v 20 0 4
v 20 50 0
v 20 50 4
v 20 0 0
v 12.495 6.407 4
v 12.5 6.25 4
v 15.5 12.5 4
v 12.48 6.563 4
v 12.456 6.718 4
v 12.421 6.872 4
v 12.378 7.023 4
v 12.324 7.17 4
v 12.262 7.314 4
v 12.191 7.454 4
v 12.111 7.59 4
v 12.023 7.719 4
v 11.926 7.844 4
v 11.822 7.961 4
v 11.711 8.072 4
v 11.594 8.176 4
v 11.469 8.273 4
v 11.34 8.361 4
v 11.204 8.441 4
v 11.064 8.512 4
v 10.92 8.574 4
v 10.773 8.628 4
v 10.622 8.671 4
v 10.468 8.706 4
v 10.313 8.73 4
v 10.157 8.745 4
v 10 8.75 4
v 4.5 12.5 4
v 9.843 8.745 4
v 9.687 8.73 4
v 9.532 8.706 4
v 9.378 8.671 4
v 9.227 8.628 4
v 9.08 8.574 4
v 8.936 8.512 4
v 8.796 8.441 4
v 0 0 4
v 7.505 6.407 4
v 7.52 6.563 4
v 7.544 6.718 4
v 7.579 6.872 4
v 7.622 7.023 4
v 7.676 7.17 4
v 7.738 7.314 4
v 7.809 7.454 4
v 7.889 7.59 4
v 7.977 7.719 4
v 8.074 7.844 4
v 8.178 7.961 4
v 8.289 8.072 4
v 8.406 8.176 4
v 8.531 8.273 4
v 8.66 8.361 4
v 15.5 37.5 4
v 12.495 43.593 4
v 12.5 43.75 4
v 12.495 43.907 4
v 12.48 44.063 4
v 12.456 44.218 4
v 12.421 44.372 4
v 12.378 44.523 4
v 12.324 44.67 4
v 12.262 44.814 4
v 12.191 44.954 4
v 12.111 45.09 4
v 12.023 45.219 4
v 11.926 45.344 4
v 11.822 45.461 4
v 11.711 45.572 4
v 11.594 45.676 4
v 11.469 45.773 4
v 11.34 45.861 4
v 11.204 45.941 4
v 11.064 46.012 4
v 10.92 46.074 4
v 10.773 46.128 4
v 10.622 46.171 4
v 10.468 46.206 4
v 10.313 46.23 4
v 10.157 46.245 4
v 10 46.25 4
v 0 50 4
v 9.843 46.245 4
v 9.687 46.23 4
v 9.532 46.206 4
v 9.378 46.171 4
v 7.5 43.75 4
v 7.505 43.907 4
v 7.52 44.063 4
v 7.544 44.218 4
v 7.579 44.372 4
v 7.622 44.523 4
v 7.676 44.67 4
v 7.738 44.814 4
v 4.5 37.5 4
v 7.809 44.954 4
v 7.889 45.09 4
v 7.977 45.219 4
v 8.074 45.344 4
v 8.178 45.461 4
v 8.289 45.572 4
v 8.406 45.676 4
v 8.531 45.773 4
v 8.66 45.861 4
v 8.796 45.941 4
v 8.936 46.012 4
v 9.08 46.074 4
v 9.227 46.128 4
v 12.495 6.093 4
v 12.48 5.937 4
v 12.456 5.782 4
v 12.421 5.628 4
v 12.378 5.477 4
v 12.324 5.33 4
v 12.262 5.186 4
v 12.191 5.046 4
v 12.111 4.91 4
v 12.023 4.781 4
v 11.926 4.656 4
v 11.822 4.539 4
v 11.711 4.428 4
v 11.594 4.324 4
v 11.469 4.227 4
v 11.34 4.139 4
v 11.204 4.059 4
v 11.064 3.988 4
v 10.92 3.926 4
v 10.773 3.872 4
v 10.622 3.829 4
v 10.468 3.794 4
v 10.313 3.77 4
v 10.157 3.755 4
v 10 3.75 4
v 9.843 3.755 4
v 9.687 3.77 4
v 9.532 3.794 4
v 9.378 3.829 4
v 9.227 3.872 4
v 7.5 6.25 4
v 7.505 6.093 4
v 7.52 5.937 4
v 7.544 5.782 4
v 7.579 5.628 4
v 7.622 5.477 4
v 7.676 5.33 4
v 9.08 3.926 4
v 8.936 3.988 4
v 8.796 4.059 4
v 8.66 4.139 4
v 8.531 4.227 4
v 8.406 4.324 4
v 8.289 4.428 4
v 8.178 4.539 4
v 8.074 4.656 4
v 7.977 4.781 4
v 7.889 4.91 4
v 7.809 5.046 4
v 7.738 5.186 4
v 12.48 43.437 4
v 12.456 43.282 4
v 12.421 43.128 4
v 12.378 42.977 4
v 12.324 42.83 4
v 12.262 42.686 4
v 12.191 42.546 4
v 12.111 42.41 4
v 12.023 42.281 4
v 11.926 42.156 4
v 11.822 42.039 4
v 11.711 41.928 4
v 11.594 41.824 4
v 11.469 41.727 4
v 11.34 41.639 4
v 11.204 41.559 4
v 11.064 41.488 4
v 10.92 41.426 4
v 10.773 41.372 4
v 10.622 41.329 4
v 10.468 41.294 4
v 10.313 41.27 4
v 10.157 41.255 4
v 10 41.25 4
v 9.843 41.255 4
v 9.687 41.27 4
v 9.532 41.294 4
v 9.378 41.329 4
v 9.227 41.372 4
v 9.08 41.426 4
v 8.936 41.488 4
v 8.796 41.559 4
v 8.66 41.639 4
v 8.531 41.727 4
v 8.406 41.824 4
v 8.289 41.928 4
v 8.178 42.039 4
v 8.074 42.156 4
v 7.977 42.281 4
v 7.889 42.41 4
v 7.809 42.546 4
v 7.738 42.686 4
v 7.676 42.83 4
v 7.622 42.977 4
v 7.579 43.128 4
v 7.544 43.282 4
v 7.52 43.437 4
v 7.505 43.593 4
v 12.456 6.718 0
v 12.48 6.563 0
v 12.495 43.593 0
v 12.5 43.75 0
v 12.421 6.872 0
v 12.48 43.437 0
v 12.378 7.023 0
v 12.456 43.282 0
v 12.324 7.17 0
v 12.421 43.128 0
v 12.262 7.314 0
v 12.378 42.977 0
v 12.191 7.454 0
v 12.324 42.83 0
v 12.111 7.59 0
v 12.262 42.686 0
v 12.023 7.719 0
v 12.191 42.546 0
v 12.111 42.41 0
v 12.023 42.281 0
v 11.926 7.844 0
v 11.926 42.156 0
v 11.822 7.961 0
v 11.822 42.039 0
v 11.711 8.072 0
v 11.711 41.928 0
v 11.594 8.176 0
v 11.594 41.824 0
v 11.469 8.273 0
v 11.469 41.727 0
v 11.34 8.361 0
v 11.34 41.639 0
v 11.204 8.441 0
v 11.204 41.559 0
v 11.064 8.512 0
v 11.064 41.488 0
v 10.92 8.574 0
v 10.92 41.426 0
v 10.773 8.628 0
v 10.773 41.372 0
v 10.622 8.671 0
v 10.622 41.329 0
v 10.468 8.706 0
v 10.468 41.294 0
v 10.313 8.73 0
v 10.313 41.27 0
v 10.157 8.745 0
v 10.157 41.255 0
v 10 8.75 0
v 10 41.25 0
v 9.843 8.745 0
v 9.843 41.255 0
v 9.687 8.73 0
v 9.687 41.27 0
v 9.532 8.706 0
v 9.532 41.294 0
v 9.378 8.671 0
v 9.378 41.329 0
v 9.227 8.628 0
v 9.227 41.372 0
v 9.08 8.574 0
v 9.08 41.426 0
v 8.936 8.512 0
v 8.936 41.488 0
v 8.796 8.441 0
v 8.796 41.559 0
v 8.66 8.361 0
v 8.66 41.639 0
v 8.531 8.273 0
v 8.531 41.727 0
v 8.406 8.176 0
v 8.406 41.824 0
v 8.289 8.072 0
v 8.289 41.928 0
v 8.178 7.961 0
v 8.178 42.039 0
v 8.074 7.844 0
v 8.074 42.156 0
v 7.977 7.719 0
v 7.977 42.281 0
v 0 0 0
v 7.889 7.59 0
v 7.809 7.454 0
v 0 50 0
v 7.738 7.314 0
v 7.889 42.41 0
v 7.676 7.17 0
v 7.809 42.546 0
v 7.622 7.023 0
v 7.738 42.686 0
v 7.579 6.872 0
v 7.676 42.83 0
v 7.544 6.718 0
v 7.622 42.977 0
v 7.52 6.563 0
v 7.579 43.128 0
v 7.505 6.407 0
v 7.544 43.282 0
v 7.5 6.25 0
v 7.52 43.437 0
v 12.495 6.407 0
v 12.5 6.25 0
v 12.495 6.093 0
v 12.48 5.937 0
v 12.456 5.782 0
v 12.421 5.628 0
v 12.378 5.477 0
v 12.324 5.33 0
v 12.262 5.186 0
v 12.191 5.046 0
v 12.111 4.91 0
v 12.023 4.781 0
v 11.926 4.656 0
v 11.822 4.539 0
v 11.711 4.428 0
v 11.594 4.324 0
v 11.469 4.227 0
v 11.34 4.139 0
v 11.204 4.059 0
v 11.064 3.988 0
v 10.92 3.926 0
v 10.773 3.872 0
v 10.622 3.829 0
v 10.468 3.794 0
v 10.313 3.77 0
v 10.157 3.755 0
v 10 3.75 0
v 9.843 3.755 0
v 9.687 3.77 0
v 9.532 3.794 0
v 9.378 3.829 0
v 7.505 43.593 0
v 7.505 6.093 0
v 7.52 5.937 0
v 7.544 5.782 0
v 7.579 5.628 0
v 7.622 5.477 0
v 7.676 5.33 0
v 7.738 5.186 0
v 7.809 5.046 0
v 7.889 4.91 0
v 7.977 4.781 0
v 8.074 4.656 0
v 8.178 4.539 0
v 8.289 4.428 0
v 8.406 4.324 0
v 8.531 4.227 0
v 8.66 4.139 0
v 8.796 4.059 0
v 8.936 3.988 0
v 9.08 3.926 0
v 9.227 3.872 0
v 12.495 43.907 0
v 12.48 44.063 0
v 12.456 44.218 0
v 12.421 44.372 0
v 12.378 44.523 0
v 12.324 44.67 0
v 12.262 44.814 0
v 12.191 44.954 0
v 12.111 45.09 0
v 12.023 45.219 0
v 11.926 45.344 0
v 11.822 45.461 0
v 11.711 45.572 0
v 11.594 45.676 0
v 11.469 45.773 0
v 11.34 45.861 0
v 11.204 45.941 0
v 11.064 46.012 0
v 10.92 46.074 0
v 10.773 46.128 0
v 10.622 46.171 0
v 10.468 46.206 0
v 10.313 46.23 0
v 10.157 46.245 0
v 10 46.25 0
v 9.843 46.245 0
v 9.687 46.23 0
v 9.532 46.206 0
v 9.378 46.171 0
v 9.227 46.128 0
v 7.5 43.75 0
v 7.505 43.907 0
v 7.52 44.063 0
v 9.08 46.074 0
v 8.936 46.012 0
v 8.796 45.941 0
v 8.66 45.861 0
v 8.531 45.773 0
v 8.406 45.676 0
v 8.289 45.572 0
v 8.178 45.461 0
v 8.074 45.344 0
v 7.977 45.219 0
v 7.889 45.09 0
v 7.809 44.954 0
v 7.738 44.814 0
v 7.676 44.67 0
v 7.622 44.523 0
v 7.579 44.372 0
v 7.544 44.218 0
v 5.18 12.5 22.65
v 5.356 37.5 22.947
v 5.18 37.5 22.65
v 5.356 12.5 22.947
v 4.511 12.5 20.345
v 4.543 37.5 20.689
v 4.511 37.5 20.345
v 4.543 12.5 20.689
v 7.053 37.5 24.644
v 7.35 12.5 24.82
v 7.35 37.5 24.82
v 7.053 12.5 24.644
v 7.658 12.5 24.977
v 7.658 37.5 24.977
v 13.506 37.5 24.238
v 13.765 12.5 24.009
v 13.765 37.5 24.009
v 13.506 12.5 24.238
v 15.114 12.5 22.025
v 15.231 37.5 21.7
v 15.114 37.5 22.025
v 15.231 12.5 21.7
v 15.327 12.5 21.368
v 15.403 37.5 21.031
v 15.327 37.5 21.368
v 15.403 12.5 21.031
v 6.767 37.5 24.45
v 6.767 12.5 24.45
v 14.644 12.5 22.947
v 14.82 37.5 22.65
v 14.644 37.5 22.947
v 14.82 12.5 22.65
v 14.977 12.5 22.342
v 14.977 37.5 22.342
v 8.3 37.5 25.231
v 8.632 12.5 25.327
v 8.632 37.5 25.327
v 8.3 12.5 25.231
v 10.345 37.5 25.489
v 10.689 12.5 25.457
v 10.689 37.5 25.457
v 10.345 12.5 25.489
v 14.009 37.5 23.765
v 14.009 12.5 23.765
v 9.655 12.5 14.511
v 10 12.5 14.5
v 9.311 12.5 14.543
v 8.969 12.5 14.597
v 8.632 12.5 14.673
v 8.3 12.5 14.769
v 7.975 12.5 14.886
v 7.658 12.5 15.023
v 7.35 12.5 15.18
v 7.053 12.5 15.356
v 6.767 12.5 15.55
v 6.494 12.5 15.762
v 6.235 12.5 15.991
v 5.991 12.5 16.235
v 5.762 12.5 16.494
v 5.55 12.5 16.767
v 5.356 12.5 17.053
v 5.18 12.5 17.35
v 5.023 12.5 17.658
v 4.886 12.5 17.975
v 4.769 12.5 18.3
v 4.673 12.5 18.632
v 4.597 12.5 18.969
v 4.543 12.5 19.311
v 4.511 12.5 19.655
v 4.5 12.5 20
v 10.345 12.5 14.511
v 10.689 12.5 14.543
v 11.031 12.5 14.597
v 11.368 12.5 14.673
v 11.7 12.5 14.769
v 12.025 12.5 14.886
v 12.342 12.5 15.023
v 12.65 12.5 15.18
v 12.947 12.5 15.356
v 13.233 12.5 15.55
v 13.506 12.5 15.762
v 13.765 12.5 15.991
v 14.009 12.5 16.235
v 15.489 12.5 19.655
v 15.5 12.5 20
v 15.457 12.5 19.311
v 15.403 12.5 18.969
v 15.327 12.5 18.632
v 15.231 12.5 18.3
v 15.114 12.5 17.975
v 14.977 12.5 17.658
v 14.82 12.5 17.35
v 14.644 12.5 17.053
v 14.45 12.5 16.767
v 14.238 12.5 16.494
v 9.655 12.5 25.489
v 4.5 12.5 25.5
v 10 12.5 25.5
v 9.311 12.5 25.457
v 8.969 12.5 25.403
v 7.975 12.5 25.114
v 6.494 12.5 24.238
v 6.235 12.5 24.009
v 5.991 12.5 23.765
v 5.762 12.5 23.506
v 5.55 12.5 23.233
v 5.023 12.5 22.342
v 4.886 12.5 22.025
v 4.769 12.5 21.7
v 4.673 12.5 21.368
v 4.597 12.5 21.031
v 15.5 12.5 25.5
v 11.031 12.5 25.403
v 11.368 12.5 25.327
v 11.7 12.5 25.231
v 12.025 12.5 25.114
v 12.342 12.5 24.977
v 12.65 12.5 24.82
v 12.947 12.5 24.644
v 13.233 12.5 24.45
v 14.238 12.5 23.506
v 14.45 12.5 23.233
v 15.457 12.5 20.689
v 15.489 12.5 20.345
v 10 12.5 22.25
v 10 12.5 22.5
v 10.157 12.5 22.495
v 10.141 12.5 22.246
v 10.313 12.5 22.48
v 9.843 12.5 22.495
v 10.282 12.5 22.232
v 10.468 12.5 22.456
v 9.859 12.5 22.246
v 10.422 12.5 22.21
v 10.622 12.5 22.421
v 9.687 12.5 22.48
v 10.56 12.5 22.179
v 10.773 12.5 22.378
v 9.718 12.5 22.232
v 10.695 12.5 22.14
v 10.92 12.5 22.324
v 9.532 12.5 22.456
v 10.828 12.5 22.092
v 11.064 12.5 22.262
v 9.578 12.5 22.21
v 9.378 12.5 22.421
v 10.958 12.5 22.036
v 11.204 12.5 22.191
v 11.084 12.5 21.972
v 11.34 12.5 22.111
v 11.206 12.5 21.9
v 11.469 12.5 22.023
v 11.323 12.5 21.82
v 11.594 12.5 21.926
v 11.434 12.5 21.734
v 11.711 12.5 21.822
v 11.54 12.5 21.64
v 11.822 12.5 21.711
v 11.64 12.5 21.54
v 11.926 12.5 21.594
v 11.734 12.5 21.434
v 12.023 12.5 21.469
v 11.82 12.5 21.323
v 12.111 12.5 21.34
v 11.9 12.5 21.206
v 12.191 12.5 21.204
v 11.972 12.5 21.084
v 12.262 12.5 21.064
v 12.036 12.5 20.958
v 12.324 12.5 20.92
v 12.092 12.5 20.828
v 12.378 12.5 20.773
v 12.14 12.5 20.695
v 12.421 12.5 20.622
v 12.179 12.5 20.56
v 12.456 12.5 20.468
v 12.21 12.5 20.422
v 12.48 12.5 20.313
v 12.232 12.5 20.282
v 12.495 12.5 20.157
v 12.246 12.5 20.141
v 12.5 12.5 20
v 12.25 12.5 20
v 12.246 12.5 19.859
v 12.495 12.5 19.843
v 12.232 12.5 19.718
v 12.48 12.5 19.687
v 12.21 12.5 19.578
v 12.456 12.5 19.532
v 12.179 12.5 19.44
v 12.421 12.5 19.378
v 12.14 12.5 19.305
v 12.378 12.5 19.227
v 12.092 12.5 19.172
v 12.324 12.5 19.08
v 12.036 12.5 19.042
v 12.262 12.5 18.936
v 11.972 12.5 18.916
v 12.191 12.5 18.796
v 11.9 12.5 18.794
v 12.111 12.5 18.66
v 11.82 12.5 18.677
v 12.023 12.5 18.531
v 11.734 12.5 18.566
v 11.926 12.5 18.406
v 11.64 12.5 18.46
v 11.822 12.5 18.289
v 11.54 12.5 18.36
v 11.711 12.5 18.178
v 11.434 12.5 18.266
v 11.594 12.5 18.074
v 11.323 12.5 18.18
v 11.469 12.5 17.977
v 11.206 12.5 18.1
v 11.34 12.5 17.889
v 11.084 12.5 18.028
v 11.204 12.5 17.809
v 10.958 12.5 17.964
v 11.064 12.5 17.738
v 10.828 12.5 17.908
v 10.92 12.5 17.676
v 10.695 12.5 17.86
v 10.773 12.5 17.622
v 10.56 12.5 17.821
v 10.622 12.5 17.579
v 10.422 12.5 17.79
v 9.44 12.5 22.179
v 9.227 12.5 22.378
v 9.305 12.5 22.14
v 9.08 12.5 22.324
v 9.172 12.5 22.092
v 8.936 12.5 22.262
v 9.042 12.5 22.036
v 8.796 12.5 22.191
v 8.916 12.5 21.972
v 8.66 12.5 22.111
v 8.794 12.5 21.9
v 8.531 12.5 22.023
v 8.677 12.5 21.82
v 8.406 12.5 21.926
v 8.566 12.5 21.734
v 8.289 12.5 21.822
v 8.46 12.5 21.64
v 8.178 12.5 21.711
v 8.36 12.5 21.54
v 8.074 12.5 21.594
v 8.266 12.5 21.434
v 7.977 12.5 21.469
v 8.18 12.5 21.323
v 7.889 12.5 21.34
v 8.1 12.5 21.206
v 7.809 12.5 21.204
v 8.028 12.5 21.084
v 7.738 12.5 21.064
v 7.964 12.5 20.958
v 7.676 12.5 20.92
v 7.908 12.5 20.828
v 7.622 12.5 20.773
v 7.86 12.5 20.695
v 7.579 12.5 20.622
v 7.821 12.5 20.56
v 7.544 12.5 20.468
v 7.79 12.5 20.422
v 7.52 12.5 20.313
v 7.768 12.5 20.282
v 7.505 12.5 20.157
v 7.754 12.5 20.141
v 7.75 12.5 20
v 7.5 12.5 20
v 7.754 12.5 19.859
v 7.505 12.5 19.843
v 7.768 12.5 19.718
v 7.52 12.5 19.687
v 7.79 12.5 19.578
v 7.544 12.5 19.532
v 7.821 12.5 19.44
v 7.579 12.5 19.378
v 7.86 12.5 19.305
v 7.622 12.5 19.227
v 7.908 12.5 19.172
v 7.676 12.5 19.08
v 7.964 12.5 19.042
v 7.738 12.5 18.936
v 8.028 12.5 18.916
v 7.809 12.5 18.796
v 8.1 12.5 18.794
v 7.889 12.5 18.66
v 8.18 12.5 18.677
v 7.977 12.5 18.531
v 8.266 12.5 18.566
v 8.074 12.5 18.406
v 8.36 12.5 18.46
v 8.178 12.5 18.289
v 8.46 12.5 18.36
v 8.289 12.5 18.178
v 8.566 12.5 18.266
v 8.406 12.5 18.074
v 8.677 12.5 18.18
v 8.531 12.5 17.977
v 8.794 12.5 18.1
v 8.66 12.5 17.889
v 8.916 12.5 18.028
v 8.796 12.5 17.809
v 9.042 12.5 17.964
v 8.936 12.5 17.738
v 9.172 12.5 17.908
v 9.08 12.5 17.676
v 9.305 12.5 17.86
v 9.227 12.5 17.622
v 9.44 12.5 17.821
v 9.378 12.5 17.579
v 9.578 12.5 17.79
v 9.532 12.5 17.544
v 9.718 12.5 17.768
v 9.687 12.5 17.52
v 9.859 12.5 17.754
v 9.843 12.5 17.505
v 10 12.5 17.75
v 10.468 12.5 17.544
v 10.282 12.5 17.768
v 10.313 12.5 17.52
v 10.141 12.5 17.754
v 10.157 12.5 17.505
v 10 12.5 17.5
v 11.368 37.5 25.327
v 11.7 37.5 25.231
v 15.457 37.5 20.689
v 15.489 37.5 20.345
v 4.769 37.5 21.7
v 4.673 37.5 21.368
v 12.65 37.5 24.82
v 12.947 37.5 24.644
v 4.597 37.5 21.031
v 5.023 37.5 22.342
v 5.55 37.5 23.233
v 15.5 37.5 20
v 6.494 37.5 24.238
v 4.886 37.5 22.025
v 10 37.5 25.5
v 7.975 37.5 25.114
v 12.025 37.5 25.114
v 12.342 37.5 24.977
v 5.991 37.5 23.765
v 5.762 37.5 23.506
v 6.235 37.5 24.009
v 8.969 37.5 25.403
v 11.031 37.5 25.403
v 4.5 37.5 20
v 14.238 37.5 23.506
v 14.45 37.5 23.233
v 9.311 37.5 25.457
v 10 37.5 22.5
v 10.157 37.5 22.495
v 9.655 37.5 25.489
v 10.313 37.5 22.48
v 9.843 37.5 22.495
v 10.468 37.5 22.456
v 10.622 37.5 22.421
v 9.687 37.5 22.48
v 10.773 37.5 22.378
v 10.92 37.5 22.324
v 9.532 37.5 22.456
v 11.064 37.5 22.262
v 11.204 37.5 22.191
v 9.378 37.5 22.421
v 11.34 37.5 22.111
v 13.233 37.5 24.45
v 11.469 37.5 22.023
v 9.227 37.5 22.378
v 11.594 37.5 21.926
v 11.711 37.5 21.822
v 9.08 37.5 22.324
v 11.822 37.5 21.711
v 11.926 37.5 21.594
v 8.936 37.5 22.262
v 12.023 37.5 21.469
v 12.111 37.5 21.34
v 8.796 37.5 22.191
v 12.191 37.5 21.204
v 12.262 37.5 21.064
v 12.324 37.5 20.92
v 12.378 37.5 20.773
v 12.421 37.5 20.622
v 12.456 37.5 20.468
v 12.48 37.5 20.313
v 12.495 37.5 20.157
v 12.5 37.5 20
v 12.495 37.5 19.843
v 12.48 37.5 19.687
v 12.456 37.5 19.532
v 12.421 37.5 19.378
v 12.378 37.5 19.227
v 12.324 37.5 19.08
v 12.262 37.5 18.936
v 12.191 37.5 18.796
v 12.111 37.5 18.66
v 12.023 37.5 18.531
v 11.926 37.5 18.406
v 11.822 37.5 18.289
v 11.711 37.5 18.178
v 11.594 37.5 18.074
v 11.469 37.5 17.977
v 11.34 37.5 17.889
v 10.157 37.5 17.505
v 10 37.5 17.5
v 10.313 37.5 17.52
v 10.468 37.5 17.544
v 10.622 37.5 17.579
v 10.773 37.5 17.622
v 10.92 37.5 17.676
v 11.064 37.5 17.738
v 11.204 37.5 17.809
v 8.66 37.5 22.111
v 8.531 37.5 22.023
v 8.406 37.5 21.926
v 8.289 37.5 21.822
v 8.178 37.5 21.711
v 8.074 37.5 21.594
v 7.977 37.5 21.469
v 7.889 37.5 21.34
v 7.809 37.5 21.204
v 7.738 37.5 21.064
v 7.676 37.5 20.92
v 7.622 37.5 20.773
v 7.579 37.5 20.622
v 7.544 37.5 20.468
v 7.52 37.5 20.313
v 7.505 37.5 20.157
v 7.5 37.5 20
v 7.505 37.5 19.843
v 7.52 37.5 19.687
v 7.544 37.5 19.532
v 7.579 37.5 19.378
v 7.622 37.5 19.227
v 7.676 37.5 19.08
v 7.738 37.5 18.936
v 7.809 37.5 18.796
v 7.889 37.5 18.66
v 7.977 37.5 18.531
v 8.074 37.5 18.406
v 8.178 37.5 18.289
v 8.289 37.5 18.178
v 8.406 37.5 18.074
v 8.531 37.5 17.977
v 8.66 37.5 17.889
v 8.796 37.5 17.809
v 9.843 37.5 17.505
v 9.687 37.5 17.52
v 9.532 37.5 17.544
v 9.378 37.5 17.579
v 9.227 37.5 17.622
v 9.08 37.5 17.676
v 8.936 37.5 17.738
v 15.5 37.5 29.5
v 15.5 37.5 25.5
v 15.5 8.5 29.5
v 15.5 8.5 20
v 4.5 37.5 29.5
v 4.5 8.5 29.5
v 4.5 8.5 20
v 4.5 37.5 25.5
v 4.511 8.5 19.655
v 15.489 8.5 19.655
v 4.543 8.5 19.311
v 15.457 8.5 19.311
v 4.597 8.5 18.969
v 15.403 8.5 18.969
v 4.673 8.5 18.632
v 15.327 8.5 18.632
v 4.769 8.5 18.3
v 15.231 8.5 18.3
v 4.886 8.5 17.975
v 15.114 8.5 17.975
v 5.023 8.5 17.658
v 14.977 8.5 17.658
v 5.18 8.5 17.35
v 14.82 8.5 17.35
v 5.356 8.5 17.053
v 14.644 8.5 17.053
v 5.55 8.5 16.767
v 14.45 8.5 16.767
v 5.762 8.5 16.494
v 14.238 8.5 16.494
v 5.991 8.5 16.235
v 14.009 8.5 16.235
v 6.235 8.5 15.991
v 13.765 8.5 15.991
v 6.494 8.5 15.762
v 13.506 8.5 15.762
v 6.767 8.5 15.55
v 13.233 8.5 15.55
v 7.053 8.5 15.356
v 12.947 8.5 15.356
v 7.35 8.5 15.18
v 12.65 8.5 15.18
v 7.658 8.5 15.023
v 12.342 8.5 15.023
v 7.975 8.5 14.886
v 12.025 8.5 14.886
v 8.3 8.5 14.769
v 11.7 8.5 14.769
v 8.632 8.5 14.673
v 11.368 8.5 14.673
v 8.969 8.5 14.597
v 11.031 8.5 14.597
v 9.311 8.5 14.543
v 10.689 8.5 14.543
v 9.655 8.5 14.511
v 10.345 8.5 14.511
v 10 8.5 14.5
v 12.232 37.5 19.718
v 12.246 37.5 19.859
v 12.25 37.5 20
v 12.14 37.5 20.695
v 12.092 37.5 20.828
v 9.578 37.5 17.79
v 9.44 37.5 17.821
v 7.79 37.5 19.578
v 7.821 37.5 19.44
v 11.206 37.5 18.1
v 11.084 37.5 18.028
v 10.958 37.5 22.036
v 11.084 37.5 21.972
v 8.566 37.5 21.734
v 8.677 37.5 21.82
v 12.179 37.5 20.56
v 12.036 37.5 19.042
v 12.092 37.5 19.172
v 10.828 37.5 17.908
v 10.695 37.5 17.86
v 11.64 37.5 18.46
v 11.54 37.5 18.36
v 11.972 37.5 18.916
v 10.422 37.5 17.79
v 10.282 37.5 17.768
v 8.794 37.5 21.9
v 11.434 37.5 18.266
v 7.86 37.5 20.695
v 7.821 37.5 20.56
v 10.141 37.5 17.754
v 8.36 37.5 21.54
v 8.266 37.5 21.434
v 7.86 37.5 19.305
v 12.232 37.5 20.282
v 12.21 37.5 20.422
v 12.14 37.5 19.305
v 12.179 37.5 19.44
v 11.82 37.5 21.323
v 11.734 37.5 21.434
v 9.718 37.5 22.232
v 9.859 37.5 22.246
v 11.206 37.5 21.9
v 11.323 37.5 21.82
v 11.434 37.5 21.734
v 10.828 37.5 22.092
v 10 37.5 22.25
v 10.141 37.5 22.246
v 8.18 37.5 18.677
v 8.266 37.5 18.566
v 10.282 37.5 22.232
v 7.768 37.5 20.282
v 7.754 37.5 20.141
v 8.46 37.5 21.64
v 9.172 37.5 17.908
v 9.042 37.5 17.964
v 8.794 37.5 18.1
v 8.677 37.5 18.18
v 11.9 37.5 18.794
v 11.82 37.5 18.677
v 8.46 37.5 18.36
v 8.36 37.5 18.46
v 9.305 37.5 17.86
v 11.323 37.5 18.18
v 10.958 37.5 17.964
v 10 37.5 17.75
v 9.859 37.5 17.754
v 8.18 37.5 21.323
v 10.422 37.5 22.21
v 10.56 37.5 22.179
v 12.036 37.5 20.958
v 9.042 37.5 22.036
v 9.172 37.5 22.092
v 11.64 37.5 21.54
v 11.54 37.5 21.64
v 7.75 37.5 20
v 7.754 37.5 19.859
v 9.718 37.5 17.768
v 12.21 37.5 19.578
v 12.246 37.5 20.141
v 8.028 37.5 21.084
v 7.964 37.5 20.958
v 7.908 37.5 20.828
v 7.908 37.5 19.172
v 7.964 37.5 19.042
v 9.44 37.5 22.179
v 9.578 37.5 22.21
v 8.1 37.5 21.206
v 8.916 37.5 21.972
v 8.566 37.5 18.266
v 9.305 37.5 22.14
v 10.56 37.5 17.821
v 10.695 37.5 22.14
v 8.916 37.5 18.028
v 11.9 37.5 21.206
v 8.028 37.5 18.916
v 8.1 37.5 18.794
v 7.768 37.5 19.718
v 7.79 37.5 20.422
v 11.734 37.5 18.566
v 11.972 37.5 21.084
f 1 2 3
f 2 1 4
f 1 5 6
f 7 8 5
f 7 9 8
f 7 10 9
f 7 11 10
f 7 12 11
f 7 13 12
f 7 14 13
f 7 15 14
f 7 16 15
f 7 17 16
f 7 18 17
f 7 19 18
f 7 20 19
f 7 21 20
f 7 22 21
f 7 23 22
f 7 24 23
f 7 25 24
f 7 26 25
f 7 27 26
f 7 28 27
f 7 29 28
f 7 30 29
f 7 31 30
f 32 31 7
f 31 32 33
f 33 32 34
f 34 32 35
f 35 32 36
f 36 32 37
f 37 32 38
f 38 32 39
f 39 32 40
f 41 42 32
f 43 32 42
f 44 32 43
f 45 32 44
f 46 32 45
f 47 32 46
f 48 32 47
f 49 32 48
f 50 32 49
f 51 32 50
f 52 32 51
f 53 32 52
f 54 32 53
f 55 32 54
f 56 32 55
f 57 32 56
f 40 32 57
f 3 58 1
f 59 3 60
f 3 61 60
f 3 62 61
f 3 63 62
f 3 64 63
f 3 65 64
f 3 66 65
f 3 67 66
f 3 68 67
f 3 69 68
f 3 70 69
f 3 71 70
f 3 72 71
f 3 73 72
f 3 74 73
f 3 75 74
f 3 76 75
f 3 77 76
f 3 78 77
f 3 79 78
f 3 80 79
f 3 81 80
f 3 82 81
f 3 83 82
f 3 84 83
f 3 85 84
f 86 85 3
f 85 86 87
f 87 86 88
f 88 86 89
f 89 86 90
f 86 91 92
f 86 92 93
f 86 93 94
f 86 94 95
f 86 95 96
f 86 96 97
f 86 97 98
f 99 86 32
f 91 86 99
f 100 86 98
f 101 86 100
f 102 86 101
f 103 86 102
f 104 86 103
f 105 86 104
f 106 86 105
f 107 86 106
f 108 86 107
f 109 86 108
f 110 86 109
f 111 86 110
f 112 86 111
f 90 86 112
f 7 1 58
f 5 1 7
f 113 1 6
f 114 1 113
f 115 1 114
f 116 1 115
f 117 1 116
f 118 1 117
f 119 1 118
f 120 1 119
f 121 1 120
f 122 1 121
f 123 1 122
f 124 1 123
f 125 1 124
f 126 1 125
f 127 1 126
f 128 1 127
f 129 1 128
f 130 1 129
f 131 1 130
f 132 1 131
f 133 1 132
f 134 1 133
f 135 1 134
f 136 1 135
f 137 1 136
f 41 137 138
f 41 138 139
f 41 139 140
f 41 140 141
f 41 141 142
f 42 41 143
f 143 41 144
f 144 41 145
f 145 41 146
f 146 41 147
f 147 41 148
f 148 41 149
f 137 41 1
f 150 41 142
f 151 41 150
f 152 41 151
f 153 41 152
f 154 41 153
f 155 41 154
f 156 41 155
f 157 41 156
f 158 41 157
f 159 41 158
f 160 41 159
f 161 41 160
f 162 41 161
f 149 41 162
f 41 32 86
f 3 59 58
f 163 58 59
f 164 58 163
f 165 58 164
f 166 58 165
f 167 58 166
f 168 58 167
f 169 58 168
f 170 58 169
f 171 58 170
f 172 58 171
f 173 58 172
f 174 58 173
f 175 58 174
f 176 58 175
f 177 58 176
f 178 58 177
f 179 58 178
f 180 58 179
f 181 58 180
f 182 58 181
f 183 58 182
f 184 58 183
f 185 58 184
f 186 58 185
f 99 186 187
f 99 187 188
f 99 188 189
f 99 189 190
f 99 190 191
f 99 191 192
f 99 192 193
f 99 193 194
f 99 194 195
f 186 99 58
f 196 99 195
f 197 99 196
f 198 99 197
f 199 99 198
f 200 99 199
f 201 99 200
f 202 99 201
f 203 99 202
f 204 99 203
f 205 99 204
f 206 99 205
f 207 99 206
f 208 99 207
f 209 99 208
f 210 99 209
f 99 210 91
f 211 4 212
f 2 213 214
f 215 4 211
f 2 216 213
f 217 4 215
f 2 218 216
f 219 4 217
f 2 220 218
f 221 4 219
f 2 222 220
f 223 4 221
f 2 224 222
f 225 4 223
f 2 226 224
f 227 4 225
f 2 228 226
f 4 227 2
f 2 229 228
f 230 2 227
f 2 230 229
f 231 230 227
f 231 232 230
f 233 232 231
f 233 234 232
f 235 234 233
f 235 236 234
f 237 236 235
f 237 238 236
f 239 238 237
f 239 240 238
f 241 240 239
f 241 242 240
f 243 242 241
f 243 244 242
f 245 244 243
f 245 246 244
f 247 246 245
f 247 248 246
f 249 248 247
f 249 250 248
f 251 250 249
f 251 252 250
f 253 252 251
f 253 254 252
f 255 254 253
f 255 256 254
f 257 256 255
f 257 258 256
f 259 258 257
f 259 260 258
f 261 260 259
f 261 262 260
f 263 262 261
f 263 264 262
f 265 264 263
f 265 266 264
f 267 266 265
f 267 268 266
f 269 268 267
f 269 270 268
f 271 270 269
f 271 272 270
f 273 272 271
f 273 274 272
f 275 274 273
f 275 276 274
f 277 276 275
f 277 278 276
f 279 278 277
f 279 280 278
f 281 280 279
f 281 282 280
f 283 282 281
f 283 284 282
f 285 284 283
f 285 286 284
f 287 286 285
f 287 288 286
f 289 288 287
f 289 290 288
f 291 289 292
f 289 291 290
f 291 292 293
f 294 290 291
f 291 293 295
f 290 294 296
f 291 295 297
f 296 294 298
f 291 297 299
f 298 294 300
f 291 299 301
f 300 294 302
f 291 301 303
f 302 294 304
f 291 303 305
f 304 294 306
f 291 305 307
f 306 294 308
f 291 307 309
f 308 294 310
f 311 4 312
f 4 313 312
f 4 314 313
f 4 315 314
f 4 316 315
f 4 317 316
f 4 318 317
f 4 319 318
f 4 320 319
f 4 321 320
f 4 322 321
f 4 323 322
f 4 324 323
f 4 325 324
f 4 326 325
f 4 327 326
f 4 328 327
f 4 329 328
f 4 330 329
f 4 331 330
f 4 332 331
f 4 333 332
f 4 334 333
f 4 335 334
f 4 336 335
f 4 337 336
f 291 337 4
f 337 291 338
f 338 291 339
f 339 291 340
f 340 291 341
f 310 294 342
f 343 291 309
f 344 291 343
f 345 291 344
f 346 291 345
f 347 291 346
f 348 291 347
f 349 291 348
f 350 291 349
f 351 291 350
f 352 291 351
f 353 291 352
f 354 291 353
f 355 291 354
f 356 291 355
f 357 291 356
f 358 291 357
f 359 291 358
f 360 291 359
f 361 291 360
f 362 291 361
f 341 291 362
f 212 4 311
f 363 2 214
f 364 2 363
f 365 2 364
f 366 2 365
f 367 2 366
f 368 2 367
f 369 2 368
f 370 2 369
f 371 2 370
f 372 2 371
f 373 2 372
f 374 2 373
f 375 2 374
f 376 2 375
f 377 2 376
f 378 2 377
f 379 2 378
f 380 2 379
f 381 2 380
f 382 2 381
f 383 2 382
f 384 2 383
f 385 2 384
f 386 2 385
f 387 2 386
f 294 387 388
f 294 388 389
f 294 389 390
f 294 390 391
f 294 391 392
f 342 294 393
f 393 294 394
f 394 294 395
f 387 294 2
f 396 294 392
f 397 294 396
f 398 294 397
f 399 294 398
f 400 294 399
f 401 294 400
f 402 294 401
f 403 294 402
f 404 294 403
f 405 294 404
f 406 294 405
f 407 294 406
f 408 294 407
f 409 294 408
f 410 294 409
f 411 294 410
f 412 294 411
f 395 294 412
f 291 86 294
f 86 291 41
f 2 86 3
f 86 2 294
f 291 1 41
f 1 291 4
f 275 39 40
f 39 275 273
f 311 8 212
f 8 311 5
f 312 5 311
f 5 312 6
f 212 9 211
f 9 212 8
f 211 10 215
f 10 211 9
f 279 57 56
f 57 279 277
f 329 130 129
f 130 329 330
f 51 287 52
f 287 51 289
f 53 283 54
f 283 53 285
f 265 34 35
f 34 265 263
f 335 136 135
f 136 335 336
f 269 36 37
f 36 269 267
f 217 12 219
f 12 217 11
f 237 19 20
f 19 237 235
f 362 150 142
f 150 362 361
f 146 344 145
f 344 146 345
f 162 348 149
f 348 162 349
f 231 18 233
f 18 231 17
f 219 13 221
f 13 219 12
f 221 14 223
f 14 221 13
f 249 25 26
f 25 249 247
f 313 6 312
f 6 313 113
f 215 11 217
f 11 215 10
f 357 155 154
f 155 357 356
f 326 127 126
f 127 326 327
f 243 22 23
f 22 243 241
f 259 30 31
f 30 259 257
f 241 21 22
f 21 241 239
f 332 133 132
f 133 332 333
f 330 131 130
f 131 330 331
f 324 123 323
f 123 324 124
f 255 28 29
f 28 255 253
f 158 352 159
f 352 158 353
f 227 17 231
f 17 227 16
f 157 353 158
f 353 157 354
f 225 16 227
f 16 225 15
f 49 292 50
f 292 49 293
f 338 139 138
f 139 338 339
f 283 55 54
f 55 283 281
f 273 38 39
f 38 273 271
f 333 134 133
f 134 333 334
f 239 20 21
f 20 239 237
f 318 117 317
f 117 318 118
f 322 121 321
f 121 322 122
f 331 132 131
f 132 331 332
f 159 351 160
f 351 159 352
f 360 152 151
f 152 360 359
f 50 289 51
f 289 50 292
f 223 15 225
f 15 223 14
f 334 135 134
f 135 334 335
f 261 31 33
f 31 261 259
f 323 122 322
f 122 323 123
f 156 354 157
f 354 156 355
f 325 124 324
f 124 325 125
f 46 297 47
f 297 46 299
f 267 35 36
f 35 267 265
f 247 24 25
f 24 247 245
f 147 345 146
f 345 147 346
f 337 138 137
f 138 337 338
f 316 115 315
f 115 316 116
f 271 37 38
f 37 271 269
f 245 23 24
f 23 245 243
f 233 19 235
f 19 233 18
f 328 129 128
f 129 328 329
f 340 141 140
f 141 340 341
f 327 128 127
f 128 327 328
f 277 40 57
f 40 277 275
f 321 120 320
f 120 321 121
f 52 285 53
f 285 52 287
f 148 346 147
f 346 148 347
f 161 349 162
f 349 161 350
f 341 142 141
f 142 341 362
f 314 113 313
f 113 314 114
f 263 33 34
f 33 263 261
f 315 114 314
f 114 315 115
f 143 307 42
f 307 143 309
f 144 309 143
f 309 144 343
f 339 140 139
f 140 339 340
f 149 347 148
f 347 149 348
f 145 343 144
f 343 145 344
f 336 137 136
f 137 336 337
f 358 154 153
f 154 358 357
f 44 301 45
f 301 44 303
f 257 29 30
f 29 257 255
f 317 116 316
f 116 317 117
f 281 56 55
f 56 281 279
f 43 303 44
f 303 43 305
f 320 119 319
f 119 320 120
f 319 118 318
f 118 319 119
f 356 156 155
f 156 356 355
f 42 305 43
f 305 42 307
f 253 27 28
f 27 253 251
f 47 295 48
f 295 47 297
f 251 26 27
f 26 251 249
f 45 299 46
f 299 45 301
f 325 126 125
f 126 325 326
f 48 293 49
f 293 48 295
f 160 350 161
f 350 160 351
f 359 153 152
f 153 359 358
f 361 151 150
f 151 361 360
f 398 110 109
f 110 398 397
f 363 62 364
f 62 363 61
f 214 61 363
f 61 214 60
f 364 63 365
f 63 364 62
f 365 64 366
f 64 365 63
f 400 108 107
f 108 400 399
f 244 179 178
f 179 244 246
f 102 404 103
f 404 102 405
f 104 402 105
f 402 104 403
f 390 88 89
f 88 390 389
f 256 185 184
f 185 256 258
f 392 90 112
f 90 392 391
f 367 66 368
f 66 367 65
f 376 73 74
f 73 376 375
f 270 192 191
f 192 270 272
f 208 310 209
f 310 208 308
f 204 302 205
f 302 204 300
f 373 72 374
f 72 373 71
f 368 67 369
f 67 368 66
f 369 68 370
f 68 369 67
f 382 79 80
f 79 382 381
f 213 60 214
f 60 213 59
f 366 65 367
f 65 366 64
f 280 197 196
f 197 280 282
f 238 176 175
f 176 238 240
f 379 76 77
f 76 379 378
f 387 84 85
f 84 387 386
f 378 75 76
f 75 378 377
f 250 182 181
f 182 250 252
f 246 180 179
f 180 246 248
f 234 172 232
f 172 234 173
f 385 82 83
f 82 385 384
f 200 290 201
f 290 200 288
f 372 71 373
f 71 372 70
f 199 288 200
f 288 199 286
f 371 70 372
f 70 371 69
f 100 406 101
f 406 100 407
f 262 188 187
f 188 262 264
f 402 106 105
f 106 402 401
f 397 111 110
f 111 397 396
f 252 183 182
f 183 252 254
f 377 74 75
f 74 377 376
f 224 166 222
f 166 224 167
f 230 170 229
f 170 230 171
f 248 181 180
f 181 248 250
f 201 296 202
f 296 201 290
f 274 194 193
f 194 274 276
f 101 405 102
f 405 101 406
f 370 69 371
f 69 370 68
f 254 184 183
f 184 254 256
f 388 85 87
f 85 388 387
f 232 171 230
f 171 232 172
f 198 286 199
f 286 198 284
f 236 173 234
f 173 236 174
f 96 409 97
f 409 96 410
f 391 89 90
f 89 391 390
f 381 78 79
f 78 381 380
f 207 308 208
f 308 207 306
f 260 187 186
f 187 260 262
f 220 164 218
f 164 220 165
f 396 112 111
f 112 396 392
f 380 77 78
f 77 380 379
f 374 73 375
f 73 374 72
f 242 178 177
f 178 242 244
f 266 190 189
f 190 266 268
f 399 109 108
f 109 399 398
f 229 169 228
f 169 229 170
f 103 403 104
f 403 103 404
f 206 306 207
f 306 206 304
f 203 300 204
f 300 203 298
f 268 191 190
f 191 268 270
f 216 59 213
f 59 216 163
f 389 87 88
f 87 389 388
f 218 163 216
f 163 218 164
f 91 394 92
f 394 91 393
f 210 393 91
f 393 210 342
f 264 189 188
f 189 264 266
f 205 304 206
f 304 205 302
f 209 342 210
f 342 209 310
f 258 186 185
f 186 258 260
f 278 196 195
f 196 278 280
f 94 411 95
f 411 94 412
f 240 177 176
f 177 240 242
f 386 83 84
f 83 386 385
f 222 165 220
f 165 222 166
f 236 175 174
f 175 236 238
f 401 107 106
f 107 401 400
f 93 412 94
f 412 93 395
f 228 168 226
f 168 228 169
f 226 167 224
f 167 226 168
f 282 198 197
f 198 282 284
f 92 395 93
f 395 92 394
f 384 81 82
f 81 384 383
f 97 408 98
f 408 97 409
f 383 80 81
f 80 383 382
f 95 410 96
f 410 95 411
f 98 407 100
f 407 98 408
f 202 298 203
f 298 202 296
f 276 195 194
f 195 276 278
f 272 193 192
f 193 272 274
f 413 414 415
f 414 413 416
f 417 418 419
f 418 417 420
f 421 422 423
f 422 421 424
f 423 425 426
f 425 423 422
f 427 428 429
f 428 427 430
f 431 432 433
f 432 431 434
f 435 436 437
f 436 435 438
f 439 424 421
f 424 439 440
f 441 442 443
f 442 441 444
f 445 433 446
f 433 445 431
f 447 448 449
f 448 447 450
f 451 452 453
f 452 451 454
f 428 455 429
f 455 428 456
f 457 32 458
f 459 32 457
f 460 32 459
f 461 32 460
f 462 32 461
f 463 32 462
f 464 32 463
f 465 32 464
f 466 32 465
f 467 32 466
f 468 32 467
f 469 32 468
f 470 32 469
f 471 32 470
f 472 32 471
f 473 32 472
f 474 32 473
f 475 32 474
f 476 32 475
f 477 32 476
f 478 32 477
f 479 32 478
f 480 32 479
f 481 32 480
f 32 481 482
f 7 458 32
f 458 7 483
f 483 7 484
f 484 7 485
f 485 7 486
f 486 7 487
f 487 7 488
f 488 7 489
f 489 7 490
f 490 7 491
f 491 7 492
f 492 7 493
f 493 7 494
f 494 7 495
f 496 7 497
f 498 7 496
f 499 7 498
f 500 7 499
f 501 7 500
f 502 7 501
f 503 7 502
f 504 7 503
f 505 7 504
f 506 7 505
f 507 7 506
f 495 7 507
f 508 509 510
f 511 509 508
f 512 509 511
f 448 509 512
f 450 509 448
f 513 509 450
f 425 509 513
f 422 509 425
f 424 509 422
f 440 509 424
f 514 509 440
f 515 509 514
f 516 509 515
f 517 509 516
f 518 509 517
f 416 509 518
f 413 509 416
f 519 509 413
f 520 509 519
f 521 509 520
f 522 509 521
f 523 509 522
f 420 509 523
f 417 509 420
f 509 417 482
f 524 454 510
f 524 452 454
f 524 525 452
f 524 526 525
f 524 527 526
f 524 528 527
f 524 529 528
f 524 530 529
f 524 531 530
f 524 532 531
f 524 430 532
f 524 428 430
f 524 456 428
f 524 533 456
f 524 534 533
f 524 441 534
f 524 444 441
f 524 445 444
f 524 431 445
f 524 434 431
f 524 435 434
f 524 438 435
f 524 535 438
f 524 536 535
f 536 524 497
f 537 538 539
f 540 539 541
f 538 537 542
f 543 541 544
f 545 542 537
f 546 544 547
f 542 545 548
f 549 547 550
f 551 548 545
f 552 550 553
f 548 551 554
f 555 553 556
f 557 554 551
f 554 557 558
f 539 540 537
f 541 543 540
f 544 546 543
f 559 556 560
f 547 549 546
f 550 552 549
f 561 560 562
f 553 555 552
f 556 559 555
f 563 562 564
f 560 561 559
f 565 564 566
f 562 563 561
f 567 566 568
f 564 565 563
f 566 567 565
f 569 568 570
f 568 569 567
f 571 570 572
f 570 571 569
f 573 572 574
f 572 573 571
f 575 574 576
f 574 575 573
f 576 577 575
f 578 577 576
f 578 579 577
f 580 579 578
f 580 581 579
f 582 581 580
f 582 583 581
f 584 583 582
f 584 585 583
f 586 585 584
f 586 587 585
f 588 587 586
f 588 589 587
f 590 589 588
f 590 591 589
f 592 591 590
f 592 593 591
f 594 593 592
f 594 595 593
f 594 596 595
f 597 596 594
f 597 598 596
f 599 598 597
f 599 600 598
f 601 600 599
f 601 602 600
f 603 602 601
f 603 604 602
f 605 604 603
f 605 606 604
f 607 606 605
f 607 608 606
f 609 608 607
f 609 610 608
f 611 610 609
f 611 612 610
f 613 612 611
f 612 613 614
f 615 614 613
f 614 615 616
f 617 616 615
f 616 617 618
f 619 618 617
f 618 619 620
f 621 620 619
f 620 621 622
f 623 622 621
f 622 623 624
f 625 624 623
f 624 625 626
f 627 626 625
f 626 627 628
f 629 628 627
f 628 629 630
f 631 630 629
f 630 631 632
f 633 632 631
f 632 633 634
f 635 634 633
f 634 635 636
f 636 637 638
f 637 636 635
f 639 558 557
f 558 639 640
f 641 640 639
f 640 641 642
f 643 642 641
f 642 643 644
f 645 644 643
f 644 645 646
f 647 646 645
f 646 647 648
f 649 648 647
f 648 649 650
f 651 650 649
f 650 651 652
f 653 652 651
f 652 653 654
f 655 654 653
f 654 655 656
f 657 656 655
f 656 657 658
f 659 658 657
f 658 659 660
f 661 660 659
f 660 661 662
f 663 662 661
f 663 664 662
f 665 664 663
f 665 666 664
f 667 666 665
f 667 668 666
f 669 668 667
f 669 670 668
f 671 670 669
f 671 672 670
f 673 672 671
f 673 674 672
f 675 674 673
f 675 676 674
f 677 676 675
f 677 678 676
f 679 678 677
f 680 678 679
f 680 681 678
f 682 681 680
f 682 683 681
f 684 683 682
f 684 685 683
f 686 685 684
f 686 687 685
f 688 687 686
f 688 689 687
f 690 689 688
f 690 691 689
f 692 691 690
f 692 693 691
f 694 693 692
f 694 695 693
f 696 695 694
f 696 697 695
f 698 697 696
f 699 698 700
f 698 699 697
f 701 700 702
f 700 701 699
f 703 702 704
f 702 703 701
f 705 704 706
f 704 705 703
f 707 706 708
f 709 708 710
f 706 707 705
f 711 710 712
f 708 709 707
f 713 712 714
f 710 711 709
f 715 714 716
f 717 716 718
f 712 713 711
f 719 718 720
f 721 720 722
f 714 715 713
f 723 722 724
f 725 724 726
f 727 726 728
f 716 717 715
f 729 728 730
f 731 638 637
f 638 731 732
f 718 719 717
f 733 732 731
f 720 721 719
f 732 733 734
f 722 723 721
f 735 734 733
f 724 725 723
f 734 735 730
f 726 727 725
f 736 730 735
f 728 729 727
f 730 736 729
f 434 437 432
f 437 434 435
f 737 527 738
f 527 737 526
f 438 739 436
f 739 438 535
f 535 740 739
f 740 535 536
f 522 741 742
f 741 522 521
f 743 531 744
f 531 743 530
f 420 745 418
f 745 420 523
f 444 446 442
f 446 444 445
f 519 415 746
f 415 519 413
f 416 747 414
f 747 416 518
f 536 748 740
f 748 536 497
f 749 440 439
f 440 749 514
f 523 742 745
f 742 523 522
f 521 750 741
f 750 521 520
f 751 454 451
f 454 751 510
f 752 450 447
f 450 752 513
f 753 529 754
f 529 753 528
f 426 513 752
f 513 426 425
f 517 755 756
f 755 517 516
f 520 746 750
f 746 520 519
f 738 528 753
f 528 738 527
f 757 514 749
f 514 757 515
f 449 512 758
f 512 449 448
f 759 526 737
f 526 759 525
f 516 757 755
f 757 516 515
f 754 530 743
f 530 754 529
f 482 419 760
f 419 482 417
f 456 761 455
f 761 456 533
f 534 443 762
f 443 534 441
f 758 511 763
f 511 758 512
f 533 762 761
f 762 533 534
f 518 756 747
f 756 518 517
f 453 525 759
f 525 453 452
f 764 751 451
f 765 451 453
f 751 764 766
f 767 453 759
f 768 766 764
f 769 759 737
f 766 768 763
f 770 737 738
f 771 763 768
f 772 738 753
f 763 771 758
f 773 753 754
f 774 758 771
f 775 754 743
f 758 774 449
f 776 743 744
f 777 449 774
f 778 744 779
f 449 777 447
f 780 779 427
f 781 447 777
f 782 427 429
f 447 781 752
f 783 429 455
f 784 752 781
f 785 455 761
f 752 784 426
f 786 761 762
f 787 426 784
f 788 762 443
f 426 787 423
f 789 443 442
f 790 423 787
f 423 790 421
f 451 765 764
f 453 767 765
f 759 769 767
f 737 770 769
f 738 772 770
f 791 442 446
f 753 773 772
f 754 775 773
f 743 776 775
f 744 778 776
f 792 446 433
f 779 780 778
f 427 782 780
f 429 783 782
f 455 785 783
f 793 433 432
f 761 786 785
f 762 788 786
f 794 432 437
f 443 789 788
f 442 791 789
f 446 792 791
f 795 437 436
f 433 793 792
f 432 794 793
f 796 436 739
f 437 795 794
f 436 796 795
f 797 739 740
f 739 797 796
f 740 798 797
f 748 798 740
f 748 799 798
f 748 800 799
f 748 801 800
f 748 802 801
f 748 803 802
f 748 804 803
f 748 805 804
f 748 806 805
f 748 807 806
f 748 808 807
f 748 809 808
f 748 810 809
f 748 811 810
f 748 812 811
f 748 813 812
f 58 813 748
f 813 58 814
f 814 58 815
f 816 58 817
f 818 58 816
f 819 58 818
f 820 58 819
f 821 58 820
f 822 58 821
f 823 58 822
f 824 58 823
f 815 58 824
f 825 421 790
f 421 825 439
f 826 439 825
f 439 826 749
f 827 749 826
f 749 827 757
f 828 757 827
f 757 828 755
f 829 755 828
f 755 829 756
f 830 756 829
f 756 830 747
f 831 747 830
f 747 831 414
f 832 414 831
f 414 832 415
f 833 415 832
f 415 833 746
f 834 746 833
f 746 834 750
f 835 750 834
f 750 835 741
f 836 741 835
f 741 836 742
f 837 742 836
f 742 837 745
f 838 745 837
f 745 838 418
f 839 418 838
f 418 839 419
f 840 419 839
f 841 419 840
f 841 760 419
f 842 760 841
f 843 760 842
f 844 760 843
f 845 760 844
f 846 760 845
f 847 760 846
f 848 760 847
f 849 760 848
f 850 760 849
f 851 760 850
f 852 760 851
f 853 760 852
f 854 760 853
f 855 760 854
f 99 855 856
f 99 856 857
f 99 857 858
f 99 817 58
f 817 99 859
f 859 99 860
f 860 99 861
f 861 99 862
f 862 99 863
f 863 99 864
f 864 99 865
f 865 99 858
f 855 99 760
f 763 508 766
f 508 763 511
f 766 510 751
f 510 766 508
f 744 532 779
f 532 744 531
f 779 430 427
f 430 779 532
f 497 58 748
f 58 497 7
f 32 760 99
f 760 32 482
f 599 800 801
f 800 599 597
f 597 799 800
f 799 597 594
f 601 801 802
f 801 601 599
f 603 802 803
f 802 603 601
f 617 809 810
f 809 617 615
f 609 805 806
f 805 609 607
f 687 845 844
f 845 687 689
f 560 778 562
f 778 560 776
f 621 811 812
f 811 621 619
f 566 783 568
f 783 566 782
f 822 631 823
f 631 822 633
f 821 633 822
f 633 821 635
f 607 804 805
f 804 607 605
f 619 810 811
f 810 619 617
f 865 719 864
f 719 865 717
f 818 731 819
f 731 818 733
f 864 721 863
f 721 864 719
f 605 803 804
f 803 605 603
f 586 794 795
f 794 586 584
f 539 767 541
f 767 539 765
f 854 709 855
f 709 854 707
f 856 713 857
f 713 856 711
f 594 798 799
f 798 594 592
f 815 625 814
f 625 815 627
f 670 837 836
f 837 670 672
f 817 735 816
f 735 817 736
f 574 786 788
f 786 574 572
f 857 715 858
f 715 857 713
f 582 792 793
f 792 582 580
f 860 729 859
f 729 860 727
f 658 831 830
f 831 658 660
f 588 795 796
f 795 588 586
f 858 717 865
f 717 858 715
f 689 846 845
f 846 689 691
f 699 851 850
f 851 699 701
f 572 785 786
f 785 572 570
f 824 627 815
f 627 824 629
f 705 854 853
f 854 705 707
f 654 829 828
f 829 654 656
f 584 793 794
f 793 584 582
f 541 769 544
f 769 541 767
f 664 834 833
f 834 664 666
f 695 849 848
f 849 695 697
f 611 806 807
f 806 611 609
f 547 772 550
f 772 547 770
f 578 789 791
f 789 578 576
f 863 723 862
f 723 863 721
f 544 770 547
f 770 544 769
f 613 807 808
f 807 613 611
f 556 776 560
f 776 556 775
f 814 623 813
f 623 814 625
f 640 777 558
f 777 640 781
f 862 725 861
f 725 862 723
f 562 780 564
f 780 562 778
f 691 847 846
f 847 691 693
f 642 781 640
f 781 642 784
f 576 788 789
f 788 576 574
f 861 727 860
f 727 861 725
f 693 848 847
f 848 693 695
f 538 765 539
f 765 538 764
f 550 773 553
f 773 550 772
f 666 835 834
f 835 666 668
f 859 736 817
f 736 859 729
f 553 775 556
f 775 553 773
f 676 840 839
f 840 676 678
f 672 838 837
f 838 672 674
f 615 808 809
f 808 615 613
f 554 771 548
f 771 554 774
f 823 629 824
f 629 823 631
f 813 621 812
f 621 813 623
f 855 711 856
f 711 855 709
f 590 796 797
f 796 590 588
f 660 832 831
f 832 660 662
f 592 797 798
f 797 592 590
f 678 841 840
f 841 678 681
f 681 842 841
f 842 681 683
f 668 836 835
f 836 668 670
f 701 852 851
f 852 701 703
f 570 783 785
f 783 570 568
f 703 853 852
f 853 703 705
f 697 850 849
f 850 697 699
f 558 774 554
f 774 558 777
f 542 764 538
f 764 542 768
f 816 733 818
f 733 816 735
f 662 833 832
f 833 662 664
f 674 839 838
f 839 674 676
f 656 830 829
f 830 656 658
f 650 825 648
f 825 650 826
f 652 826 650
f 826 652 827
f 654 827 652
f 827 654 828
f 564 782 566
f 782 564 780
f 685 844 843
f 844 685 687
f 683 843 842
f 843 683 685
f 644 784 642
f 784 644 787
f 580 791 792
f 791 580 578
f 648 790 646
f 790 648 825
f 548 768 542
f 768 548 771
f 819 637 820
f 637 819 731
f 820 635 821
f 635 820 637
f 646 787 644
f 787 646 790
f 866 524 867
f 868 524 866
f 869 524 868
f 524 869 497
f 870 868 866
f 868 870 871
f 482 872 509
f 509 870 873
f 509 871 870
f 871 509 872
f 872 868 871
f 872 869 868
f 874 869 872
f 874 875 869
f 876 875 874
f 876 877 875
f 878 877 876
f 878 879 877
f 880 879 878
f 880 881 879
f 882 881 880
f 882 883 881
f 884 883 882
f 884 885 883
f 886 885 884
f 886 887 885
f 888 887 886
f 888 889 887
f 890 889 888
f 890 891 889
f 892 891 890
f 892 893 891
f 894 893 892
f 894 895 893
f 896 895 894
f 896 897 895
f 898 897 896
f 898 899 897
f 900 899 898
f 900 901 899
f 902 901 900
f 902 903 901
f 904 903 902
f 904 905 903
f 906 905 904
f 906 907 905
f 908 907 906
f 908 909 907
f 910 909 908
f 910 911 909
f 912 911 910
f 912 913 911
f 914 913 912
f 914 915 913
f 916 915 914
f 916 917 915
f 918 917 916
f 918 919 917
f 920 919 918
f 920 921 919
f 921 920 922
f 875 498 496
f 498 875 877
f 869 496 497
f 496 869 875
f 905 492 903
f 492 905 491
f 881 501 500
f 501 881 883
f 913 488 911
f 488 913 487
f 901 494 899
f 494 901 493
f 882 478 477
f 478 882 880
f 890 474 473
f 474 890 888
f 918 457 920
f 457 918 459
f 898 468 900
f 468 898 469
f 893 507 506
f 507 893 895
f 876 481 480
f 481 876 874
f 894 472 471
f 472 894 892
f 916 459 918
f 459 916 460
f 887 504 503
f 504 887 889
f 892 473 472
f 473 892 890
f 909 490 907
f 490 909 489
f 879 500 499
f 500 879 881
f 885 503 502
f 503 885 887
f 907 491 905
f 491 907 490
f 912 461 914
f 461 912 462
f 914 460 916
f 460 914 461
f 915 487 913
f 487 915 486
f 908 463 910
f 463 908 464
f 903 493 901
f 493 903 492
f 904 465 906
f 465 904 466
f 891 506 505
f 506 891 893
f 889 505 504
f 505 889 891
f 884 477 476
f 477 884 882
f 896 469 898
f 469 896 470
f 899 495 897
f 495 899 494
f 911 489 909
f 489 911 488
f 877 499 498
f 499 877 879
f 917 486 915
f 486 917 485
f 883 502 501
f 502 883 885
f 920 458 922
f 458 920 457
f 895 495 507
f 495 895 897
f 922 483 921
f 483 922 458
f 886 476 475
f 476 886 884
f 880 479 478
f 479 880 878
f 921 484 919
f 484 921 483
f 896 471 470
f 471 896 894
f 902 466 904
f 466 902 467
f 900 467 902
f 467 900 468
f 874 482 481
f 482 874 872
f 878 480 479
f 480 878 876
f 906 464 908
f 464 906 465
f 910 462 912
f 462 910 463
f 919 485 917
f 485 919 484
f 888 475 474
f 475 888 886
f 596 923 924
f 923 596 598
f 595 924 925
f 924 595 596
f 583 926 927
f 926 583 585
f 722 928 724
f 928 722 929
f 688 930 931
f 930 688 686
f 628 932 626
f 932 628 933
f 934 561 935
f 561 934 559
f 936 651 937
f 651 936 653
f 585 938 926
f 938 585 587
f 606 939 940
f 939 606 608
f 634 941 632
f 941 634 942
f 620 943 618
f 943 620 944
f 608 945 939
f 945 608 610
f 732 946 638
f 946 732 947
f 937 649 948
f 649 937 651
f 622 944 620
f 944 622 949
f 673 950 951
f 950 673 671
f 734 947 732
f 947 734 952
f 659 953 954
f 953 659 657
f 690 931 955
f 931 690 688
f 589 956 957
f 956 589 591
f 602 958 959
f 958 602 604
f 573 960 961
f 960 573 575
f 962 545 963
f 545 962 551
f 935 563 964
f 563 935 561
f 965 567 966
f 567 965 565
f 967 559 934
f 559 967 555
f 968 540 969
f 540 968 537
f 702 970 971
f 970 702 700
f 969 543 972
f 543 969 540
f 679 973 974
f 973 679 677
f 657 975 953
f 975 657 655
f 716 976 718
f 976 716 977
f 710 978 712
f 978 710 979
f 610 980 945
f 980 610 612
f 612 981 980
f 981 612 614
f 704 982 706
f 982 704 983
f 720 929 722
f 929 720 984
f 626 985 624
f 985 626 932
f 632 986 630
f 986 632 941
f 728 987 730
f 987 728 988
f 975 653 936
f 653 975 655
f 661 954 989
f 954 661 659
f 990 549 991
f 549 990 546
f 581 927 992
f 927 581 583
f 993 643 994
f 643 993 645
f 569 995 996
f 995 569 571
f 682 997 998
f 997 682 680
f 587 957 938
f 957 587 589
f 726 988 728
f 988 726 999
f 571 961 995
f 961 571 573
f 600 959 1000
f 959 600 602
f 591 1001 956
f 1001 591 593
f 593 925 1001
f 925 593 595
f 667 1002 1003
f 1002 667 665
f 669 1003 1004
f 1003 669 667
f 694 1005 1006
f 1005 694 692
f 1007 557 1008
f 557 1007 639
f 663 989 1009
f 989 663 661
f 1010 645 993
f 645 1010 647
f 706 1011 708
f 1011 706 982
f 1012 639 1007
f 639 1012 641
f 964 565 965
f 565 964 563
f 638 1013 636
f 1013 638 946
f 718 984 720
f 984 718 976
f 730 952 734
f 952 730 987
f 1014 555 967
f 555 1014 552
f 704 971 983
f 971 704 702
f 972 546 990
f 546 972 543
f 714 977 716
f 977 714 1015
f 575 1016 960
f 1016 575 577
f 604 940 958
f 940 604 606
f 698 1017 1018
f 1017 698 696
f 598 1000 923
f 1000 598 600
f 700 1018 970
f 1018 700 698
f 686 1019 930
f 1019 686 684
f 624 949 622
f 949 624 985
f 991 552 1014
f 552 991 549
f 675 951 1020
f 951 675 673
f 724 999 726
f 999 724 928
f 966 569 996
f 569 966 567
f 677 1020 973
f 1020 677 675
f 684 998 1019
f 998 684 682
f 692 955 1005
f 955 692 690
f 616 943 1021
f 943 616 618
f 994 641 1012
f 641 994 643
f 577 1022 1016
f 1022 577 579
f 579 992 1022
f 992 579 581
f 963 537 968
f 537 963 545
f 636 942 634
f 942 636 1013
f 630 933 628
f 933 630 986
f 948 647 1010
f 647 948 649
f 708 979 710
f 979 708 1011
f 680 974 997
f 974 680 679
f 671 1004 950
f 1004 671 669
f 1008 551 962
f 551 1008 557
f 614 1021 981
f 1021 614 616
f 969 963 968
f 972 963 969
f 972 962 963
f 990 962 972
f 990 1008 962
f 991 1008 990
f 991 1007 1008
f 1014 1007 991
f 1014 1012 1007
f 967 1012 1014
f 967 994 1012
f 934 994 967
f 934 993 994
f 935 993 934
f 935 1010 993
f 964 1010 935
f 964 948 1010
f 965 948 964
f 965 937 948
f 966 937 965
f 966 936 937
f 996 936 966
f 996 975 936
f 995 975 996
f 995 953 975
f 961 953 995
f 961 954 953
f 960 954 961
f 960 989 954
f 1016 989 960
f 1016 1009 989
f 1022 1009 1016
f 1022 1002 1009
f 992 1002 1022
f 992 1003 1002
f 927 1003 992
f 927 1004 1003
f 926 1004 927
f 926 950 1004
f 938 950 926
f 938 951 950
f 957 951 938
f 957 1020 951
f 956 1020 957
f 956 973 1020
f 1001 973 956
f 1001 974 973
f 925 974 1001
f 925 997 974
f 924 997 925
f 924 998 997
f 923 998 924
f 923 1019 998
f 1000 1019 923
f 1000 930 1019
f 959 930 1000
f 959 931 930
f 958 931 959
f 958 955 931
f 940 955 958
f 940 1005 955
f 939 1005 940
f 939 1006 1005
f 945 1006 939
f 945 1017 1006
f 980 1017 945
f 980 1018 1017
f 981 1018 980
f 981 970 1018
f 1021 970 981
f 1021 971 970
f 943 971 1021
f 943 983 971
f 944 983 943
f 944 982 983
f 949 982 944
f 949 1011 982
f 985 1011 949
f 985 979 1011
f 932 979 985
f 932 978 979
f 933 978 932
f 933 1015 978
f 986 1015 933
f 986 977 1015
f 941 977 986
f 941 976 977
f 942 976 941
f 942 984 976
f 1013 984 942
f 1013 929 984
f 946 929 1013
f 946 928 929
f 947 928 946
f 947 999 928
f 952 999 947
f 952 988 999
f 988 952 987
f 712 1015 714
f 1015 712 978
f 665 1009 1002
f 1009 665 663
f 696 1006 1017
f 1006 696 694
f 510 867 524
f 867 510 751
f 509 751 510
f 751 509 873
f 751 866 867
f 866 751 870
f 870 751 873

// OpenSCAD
// Settings
// All values are in millimeters
$fn=100;

mountHeight=50;
mountWidth=20;
mountThickness=4;

wallScrewDiameter=5;

mountHoleExtrusion=16;
mountHoleDiameter=5;
mountHoleHeight=mountHeight*0.5;

wallThickness=3;

module wallMountHole(holeDiameter, thickness) {
  difference() {
    union() {
      translate([mountWidth/2,(mountHeight-mountHoleHeight)/2,mountThickness+mountHoleExtrusion])
      rotate([-90])
      cylinder(h=mountHoleHeight,d=holeDiameter+thickness*2, center=false);

      translate([mountWidth/2-(holeDiameter+thickness*2)/2,(mountHeight-mountHoleHeight)/2,mountThickness])
      cube(size = [holeDiameter+thickness*2,mountHoleHeight,mountHoleExtrusion], center=false);
    }

    translate([mountWidth/2,(mountHeight-mountHoleHeight)/2,mountThickness+mountHoleExtrusion])
    rotate([-90])
    cylinder(h=mountHoleHeight,d=holeDiameter, center=false);
  }
}

module wallMountBase() {
  difference() {
    cube(size = [mountWidth,mountHeight,mountThickness], center=false);
    // Wall hole 1
    translate([mountWidth/2,(mountHeight-mountHoleHeight)/4,0])
    cylinder(h=mountThickness,d=wallScrewDiameter);
    // Wall hole 2
    translate([mountWidth/2,mountHeight-(mountHeight-mountHoleHeight)/4,0])
    cylinder(h=mountThickness,d=wallScrewDiameter);
  }
}

module wallMount() {
  union() {
    wallMountBase();
    wallMountHole(holeDiameter=mountHoleDiameter, thickness=wallThickness);
  }
}

module speakerMount(holeDiameterRatio) {
  union() {
    translate([(mountWidth-mountHoleDiameter-wallThickness*2)/2,(mountHeight-mountHoleHeight)/2-mountThickness,mountThickness+mountHoleExtrusion])
    cube(size = [mountHoleDiameter+wallThickness*2,mountThickness,(mountHoleDiameter+wallThickness*2)/2+mountThickness], center=false);

    translate([mountWidth/2,(mountHeight-mountHoleHeight)/2-mountThickness,mountThickness+mountHoleExtrusion])
    rotate([-90])
    cylinder(h=mountThickness,d=mountHoleDiameter+wallThickness*2, center=false);

    translate([mountWidth/2,(mountHeight-mountHoleHeight)/2,mountThickness+mountHoleExtrusion])
    rotate([-90])
    cylinder(h=mountHoleHeight,d=mountHoleDiameter*holeDiameterRatio, center=false);

    translate([(mountWidth-mountHoleDiameter-wallThickness*2)/2,(mountHeight-mountHoleHeight)/2,mountThickness+mountHoleExtrusion+(mountHoleDiameter+wallThickness*2)/2])
    cube(size = [mountHoleDiameter+wallThickness*2,mountHoleHeight,mountThickness], center=false);
  }
}

wallMount();
speakerMount(holeDiameterRatio=0.9);
